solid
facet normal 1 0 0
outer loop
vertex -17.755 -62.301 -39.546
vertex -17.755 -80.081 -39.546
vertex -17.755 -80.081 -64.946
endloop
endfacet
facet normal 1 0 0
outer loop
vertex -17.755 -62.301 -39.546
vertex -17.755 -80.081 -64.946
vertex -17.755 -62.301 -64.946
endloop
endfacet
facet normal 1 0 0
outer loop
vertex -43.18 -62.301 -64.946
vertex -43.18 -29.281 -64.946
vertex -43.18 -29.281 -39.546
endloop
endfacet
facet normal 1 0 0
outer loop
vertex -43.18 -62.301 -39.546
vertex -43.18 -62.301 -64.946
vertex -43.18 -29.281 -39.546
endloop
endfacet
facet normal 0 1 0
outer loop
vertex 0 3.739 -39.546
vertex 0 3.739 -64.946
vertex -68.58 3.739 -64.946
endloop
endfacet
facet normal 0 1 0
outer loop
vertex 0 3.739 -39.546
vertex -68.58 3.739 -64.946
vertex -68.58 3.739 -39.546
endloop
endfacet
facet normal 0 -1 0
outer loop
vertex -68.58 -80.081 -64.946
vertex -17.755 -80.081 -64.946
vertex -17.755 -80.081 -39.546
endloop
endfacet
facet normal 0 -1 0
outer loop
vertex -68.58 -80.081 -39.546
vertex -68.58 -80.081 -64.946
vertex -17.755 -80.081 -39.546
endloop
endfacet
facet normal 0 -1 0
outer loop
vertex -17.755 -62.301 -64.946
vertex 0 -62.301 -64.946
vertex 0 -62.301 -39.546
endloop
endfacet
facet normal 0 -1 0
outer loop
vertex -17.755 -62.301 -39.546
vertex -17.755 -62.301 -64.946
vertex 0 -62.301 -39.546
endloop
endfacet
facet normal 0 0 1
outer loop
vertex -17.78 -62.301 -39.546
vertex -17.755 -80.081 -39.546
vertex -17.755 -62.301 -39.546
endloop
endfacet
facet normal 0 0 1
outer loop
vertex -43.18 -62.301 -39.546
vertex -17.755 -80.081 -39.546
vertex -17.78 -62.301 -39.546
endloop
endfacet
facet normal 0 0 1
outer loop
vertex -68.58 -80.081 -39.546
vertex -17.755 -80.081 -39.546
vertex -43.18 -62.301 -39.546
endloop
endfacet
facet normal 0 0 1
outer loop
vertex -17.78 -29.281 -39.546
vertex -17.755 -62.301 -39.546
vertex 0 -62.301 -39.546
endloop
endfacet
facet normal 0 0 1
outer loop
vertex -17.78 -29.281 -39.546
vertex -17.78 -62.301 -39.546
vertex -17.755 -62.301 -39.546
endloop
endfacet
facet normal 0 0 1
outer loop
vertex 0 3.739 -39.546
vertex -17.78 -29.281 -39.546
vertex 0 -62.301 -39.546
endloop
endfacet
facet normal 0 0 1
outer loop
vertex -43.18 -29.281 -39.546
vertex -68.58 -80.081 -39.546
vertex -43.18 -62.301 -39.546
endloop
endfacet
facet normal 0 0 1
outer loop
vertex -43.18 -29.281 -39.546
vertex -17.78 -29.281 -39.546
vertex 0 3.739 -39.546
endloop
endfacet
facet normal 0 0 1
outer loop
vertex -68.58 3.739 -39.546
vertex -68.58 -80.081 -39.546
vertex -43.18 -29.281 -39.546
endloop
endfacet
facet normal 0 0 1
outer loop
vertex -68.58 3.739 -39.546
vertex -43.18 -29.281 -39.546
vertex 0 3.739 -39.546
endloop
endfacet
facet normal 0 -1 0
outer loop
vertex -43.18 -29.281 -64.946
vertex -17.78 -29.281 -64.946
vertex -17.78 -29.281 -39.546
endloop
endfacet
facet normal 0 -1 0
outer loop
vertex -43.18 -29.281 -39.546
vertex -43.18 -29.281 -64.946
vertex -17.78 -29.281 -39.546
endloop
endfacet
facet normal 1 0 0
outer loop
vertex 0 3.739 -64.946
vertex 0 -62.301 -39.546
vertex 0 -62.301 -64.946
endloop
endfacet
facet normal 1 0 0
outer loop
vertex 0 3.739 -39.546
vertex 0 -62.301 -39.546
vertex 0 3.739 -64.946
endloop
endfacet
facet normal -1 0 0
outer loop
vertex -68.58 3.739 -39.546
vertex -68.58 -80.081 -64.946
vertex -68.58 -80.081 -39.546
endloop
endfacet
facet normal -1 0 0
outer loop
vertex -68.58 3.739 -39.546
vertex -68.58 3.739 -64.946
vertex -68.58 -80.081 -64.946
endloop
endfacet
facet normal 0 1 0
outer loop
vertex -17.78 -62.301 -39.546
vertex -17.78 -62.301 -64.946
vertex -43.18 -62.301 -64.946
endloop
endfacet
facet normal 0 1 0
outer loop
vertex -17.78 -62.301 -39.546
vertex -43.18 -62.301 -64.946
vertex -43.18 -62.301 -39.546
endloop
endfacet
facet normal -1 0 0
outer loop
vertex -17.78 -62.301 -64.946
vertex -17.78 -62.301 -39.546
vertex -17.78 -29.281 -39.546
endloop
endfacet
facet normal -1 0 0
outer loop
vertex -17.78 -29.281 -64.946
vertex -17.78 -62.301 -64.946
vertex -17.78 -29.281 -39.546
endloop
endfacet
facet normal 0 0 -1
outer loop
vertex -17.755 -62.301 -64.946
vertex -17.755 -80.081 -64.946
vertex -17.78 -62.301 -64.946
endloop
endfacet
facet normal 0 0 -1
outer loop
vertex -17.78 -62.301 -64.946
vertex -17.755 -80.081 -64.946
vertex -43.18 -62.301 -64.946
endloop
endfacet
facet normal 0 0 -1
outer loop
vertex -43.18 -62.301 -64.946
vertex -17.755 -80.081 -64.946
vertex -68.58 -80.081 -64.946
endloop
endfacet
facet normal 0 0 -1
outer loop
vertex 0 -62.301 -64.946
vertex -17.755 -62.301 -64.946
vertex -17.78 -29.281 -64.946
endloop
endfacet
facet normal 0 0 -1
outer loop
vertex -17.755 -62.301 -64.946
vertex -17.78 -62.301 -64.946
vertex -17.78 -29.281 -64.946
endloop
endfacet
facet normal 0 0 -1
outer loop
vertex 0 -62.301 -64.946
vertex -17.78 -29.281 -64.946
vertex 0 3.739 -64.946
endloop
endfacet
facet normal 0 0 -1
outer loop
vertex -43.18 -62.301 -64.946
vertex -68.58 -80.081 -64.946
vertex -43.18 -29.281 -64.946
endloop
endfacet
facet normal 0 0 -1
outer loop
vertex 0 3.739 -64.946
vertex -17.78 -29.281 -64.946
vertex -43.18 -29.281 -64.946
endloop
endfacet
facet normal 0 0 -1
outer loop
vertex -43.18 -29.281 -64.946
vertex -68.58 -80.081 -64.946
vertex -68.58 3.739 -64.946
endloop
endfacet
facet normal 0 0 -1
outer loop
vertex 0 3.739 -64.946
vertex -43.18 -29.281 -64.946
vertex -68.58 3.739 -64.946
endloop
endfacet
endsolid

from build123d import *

# Parameters (mm, degrees)
F0_W     = 33.02
F0_H     = 25.4
F1_DEPTH = 17.78
F2_DEPTH = 68.58
F3_W     = 25.4
F3_H     = 25.4
F4_DEPTH = 50.8
F5_W     = 17.78
F5_H     = 25.4
F6_DEPTH = 25.4254


with BuildPart() as f1:
    # F0 (on Right) → F1 (new body)
    with BuildSketch(Plane.YZ):
        with Locations((-45.790768, -52.245537)):
            Rectangle(F0_W, F0_H)
    extrude(amount=-F1_DEPTH)

    # F0 (on Right) → F2 (join)
    with BuildSketch(Plane.YZ):
        with Locations((-12.770768, -52.245537)):
            Rectangle(F0_W, F0_H)
    extrude(amount=-F2_DEPTH)

    # F3 (on face) → F4 (join)
    with BuildSketch(Plane.XZ.offset(29.280768)):
        with Locations((-55.88, -52.245537)):
            Rectangle(F3_W, F3_H)
    extrude(amount=F4_DEPTH)

    # F5 (on face) → F6 (join)
    with BuildSketch(Plane.YZ.offset(-43.18)):
        with Locations((-71.190768, -52.245537)):
            Rectangle(F5_W, F5_H)
    extrude(amount=F6_DEPTH)


solid = f1.part
